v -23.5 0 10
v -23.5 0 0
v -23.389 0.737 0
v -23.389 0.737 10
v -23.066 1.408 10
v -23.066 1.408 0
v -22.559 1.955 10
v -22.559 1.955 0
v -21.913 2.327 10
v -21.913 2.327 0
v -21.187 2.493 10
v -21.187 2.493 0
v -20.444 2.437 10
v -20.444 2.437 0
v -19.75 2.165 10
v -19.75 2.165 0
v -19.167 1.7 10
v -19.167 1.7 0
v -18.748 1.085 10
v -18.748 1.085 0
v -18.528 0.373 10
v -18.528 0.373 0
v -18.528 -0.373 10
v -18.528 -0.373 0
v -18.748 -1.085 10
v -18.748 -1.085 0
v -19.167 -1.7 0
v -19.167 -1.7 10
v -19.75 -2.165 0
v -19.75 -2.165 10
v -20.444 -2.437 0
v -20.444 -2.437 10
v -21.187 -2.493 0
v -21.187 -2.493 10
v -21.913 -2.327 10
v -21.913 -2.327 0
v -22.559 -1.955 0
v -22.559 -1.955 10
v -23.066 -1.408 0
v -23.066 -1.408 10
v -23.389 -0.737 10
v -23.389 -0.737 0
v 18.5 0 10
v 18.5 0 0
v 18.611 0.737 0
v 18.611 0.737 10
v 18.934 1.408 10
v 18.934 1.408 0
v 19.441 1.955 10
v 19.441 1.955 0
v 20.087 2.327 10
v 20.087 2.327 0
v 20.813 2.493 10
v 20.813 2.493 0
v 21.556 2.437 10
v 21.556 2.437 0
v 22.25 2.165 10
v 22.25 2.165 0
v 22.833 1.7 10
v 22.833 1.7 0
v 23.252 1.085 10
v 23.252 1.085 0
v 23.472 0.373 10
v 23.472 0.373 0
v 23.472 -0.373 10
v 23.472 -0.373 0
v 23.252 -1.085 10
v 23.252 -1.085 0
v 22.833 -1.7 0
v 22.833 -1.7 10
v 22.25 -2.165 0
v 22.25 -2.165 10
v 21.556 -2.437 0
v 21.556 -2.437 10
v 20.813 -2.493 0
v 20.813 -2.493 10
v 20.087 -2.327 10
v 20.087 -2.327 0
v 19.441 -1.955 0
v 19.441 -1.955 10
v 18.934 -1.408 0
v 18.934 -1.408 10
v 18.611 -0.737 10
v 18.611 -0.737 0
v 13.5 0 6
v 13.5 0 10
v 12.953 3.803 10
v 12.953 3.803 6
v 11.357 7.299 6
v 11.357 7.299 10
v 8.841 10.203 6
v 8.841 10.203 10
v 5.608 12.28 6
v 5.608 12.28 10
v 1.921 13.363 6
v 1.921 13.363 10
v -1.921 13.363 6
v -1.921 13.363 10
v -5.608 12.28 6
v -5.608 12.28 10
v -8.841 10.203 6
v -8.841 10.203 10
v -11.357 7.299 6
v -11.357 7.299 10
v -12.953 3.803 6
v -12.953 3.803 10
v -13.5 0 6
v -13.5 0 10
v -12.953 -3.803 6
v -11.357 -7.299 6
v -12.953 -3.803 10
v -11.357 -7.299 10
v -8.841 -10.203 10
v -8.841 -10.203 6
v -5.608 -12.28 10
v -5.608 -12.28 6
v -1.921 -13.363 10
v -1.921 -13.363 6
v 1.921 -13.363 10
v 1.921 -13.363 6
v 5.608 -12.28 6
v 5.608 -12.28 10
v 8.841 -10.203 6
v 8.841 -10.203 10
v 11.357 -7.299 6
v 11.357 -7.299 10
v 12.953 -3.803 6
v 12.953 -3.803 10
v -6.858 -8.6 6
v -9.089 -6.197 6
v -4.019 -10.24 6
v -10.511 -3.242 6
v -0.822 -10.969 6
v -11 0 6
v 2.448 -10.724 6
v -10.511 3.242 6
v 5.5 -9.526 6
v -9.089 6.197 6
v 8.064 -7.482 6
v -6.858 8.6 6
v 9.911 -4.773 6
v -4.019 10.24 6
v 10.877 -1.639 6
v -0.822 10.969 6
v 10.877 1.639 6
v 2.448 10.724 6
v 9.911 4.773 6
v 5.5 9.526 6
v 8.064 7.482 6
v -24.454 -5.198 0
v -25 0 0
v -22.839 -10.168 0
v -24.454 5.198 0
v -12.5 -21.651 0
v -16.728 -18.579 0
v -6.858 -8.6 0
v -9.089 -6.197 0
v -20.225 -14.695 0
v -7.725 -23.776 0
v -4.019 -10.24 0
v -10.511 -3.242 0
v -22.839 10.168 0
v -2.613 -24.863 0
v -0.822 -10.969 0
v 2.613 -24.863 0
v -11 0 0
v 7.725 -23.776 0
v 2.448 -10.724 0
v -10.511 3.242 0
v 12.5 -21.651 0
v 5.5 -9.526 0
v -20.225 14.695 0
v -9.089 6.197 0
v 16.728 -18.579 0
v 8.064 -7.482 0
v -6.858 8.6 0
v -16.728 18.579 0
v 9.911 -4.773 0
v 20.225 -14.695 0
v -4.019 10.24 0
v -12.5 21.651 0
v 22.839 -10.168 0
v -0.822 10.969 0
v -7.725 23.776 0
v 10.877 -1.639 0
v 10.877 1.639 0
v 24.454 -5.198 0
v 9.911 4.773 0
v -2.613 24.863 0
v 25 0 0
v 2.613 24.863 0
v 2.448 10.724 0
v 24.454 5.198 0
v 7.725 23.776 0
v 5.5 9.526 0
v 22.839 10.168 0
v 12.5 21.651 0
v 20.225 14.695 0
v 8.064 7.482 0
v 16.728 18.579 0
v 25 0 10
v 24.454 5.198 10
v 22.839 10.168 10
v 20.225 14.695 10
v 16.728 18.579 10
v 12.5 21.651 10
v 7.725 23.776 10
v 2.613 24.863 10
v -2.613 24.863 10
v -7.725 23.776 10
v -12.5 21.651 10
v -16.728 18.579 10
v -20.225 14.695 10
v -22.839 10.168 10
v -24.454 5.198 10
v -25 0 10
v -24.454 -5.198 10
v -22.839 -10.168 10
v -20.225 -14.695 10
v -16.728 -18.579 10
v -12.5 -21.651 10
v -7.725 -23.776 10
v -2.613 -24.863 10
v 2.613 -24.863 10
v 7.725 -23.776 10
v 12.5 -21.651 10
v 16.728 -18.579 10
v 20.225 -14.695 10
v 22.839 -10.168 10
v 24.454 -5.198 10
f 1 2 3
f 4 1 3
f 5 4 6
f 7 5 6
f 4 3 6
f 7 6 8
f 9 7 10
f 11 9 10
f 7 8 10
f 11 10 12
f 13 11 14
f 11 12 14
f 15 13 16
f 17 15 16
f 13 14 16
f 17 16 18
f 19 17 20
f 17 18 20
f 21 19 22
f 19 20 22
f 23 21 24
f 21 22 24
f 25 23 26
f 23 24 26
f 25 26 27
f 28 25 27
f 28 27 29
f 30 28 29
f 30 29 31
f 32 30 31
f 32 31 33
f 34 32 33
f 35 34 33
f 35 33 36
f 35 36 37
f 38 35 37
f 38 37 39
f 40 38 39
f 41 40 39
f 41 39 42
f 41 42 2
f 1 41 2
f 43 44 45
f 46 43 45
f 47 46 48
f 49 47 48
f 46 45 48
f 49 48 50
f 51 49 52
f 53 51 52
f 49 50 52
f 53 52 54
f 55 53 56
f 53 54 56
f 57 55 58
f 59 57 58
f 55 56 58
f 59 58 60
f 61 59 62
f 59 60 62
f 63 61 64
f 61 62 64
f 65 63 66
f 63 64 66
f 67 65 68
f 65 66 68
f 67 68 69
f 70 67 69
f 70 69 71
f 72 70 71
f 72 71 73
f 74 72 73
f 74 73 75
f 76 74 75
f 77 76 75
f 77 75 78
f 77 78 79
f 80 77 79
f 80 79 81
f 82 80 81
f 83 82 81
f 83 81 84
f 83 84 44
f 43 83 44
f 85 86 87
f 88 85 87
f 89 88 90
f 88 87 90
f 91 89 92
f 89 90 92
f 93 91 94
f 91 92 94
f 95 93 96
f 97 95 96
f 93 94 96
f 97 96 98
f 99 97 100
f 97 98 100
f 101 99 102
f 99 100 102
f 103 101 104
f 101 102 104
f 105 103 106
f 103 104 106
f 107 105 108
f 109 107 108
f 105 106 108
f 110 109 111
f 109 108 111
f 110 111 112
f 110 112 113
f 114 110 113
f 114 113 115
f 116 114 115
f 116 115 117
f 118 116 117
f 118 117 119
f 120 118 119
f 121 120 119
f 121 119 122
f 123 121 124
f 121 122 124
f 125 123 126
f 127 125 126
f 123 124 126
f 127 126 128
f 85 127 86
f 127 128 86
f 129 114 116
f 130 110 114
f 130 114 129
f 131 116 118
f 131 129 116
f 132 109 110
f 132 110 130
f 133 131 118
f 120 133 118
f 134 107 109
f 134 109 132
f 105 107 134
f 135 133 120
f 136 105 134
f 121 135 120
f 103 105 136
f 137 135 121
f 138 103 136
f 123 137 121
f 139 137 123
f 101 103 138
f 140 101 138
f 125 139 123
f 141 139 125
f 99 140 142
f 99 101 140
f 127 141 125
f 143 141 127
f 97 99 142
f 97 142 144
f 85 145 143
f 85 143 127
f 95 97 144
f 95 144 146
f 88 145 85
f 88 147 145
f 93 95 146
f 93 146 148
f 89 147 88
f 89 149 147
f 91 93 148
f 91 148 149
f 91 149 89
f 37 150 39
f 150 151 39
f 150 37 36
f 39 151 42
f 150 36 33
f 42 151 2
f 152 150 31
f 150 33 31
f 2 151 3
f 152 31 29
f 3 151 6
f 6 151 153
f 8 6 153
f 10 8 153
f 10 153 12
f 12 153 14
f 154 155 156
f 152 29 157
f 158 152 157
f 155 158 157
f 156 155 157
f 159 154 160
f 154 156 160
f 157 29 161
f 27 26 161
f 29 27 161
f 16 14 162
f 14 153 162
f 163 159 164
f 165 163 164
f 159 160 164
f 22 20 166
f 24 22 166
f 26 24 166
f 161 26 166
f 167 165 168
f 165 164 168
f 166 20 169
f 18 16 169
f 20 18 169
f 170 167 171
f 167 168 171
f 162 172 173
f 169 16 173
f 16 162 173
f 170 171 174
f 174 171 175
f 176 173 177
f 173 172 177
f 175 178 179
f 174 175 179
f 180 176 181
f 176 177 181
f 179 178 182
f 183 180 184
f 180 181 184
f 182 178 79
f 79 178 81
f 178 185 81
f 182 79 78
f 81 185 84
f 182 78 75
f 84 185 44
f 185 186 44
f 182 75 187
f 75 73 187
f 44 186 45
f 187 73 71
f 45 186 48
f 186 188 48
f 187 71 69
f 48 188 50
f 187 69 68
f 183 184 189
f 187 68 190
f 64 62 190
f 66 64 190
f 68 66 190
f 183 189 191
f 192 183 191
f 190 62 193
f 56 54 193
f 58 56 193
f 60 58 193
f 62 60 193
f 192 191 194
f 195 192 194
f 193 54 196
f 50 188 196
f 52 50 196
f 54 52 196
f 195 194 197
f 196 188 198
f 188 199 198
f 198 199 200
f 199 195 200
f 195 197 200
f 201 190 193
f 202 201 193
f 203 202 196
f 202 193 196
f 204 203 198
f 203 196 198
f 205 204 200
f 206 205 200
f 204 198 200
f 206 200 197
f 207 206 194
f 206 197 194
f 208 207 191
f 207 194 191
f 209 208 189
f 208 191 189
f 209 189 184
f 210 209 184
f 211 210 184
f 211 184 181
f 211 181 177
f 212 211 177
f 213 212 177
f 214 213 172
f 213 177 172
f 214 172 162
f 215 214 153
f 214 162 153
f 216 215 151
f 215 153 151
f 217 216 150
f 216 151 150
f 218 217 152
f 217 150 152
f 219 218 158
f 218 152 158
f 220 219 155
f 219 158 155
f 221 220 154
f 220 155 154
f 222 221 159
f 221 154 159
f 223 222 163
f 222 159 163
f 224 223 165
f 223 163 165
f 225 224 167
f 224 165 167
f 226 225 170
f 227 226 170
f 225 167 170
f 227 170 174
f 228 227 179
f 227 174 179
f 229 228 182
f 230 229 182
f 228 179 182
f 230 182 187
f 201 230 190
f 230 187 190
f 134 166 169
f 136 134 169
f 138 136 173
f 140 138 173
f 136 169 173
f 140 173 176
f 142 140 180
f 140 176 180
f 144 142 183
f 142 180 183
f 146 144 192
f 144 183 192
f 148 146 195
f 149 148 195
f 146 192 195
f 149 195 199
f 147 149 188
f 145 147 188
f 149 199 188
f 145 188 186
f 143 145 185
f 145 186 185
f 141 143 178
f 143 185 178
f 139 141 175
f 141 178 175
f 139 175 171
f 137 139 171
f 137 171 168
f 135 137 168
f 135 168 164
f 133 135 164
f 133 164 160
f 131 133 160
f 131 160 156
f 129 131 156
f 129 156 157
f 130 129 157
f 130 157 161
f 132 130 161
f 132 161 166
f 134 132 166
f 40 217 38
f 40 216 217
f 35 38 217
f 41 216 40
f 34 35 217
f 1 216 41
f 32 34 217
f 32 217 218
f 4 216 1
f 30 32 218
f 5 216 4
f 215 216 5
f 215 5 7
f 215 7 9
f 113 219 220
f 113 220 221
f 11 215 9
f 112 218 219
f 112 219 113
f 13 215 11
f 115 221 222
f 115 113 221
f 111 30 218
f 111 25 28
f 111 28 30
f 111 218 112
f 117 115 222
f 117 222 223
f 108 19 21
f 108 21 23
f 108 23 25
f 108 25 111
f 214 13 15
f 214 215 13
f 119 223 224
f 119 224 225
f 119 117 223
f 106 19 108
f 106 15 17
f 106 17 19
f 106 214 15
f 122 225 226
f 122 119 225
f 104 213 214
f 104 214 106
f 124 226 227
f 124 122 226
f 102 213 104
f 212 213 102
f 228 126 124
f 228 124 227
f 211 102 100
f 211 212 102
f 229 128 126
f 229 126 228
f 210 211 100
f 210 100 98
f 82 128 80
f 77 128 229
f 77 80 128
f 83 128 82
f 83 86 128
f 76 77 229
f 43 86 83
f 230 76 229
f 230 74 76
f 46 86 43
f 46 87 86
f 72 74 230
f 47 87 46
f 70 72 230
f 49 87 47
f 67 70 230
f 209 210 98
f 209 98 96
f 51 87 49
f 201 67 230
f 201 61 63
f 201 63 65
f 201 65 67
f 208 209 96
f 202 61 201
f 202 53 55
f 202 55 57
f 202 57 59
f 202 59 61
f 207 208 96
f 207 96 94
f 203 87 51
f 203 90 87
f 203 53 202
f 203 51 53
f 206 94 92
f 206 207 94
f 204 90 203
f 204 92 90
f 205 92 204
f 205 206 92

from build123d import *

# Parameters (mm, degrees)
SKETCH_1_R          = 25
EXTRUDE_1_DEPTH     = 10
SKETCH_2_R          = 13.5
CUT_EXTRUDE_1_DEPTH = 4
SKETCH_4_R          = 11
CUT_EXTRUDE_2_DEPTH = 37.742346142
M6X1_0_1_D          = 5


with BuildPart() as part:
    # ｽｹｯﾁ1 → ﾎﾞｽ - 押し出し1 (new body)
    with BuildSketch(Plane.XY):
        Circle(SKETCH_1_R)
    extrude(amount=EXTRUDE_1_DEPTH)

    # ｽｹｯﾁ2 → ｶｯﾄ - 押し出し1 (cut)
    with BuildSketch(Plane.XY.offset(10)):
        Circle(SKETCH_2_R)
    extrude(amount=-CUT_EXTRUDE_1_DEPTH, mode=Mode.SUBTRACT)

    # ｽｹｯﾁ4 → ｶｯﾄ - 押し出し2 (cut, through all)
    with BuildSketch(Plane(origin=(0, 0, 0), x_dir=(-1, 0, 0), z_dir=(0, 0, -1))):
        Circle(SKETCH_4_R)
    extrude(amount=-CUT_EXTRUDE_2_DEPTH, mode=Mode.SUBTRACT)

    # M6x1.0 ねじ穴1 (through all)
    with Locations(Plane(origin=(-21, 0, 10), x_dir=(1, 0, 0), z_dir=(0, 0, 1))):
        with Locations((0, 0), (42, 0)):
            Hole(M6X1_0_1_D / 2)


solid = part.part
